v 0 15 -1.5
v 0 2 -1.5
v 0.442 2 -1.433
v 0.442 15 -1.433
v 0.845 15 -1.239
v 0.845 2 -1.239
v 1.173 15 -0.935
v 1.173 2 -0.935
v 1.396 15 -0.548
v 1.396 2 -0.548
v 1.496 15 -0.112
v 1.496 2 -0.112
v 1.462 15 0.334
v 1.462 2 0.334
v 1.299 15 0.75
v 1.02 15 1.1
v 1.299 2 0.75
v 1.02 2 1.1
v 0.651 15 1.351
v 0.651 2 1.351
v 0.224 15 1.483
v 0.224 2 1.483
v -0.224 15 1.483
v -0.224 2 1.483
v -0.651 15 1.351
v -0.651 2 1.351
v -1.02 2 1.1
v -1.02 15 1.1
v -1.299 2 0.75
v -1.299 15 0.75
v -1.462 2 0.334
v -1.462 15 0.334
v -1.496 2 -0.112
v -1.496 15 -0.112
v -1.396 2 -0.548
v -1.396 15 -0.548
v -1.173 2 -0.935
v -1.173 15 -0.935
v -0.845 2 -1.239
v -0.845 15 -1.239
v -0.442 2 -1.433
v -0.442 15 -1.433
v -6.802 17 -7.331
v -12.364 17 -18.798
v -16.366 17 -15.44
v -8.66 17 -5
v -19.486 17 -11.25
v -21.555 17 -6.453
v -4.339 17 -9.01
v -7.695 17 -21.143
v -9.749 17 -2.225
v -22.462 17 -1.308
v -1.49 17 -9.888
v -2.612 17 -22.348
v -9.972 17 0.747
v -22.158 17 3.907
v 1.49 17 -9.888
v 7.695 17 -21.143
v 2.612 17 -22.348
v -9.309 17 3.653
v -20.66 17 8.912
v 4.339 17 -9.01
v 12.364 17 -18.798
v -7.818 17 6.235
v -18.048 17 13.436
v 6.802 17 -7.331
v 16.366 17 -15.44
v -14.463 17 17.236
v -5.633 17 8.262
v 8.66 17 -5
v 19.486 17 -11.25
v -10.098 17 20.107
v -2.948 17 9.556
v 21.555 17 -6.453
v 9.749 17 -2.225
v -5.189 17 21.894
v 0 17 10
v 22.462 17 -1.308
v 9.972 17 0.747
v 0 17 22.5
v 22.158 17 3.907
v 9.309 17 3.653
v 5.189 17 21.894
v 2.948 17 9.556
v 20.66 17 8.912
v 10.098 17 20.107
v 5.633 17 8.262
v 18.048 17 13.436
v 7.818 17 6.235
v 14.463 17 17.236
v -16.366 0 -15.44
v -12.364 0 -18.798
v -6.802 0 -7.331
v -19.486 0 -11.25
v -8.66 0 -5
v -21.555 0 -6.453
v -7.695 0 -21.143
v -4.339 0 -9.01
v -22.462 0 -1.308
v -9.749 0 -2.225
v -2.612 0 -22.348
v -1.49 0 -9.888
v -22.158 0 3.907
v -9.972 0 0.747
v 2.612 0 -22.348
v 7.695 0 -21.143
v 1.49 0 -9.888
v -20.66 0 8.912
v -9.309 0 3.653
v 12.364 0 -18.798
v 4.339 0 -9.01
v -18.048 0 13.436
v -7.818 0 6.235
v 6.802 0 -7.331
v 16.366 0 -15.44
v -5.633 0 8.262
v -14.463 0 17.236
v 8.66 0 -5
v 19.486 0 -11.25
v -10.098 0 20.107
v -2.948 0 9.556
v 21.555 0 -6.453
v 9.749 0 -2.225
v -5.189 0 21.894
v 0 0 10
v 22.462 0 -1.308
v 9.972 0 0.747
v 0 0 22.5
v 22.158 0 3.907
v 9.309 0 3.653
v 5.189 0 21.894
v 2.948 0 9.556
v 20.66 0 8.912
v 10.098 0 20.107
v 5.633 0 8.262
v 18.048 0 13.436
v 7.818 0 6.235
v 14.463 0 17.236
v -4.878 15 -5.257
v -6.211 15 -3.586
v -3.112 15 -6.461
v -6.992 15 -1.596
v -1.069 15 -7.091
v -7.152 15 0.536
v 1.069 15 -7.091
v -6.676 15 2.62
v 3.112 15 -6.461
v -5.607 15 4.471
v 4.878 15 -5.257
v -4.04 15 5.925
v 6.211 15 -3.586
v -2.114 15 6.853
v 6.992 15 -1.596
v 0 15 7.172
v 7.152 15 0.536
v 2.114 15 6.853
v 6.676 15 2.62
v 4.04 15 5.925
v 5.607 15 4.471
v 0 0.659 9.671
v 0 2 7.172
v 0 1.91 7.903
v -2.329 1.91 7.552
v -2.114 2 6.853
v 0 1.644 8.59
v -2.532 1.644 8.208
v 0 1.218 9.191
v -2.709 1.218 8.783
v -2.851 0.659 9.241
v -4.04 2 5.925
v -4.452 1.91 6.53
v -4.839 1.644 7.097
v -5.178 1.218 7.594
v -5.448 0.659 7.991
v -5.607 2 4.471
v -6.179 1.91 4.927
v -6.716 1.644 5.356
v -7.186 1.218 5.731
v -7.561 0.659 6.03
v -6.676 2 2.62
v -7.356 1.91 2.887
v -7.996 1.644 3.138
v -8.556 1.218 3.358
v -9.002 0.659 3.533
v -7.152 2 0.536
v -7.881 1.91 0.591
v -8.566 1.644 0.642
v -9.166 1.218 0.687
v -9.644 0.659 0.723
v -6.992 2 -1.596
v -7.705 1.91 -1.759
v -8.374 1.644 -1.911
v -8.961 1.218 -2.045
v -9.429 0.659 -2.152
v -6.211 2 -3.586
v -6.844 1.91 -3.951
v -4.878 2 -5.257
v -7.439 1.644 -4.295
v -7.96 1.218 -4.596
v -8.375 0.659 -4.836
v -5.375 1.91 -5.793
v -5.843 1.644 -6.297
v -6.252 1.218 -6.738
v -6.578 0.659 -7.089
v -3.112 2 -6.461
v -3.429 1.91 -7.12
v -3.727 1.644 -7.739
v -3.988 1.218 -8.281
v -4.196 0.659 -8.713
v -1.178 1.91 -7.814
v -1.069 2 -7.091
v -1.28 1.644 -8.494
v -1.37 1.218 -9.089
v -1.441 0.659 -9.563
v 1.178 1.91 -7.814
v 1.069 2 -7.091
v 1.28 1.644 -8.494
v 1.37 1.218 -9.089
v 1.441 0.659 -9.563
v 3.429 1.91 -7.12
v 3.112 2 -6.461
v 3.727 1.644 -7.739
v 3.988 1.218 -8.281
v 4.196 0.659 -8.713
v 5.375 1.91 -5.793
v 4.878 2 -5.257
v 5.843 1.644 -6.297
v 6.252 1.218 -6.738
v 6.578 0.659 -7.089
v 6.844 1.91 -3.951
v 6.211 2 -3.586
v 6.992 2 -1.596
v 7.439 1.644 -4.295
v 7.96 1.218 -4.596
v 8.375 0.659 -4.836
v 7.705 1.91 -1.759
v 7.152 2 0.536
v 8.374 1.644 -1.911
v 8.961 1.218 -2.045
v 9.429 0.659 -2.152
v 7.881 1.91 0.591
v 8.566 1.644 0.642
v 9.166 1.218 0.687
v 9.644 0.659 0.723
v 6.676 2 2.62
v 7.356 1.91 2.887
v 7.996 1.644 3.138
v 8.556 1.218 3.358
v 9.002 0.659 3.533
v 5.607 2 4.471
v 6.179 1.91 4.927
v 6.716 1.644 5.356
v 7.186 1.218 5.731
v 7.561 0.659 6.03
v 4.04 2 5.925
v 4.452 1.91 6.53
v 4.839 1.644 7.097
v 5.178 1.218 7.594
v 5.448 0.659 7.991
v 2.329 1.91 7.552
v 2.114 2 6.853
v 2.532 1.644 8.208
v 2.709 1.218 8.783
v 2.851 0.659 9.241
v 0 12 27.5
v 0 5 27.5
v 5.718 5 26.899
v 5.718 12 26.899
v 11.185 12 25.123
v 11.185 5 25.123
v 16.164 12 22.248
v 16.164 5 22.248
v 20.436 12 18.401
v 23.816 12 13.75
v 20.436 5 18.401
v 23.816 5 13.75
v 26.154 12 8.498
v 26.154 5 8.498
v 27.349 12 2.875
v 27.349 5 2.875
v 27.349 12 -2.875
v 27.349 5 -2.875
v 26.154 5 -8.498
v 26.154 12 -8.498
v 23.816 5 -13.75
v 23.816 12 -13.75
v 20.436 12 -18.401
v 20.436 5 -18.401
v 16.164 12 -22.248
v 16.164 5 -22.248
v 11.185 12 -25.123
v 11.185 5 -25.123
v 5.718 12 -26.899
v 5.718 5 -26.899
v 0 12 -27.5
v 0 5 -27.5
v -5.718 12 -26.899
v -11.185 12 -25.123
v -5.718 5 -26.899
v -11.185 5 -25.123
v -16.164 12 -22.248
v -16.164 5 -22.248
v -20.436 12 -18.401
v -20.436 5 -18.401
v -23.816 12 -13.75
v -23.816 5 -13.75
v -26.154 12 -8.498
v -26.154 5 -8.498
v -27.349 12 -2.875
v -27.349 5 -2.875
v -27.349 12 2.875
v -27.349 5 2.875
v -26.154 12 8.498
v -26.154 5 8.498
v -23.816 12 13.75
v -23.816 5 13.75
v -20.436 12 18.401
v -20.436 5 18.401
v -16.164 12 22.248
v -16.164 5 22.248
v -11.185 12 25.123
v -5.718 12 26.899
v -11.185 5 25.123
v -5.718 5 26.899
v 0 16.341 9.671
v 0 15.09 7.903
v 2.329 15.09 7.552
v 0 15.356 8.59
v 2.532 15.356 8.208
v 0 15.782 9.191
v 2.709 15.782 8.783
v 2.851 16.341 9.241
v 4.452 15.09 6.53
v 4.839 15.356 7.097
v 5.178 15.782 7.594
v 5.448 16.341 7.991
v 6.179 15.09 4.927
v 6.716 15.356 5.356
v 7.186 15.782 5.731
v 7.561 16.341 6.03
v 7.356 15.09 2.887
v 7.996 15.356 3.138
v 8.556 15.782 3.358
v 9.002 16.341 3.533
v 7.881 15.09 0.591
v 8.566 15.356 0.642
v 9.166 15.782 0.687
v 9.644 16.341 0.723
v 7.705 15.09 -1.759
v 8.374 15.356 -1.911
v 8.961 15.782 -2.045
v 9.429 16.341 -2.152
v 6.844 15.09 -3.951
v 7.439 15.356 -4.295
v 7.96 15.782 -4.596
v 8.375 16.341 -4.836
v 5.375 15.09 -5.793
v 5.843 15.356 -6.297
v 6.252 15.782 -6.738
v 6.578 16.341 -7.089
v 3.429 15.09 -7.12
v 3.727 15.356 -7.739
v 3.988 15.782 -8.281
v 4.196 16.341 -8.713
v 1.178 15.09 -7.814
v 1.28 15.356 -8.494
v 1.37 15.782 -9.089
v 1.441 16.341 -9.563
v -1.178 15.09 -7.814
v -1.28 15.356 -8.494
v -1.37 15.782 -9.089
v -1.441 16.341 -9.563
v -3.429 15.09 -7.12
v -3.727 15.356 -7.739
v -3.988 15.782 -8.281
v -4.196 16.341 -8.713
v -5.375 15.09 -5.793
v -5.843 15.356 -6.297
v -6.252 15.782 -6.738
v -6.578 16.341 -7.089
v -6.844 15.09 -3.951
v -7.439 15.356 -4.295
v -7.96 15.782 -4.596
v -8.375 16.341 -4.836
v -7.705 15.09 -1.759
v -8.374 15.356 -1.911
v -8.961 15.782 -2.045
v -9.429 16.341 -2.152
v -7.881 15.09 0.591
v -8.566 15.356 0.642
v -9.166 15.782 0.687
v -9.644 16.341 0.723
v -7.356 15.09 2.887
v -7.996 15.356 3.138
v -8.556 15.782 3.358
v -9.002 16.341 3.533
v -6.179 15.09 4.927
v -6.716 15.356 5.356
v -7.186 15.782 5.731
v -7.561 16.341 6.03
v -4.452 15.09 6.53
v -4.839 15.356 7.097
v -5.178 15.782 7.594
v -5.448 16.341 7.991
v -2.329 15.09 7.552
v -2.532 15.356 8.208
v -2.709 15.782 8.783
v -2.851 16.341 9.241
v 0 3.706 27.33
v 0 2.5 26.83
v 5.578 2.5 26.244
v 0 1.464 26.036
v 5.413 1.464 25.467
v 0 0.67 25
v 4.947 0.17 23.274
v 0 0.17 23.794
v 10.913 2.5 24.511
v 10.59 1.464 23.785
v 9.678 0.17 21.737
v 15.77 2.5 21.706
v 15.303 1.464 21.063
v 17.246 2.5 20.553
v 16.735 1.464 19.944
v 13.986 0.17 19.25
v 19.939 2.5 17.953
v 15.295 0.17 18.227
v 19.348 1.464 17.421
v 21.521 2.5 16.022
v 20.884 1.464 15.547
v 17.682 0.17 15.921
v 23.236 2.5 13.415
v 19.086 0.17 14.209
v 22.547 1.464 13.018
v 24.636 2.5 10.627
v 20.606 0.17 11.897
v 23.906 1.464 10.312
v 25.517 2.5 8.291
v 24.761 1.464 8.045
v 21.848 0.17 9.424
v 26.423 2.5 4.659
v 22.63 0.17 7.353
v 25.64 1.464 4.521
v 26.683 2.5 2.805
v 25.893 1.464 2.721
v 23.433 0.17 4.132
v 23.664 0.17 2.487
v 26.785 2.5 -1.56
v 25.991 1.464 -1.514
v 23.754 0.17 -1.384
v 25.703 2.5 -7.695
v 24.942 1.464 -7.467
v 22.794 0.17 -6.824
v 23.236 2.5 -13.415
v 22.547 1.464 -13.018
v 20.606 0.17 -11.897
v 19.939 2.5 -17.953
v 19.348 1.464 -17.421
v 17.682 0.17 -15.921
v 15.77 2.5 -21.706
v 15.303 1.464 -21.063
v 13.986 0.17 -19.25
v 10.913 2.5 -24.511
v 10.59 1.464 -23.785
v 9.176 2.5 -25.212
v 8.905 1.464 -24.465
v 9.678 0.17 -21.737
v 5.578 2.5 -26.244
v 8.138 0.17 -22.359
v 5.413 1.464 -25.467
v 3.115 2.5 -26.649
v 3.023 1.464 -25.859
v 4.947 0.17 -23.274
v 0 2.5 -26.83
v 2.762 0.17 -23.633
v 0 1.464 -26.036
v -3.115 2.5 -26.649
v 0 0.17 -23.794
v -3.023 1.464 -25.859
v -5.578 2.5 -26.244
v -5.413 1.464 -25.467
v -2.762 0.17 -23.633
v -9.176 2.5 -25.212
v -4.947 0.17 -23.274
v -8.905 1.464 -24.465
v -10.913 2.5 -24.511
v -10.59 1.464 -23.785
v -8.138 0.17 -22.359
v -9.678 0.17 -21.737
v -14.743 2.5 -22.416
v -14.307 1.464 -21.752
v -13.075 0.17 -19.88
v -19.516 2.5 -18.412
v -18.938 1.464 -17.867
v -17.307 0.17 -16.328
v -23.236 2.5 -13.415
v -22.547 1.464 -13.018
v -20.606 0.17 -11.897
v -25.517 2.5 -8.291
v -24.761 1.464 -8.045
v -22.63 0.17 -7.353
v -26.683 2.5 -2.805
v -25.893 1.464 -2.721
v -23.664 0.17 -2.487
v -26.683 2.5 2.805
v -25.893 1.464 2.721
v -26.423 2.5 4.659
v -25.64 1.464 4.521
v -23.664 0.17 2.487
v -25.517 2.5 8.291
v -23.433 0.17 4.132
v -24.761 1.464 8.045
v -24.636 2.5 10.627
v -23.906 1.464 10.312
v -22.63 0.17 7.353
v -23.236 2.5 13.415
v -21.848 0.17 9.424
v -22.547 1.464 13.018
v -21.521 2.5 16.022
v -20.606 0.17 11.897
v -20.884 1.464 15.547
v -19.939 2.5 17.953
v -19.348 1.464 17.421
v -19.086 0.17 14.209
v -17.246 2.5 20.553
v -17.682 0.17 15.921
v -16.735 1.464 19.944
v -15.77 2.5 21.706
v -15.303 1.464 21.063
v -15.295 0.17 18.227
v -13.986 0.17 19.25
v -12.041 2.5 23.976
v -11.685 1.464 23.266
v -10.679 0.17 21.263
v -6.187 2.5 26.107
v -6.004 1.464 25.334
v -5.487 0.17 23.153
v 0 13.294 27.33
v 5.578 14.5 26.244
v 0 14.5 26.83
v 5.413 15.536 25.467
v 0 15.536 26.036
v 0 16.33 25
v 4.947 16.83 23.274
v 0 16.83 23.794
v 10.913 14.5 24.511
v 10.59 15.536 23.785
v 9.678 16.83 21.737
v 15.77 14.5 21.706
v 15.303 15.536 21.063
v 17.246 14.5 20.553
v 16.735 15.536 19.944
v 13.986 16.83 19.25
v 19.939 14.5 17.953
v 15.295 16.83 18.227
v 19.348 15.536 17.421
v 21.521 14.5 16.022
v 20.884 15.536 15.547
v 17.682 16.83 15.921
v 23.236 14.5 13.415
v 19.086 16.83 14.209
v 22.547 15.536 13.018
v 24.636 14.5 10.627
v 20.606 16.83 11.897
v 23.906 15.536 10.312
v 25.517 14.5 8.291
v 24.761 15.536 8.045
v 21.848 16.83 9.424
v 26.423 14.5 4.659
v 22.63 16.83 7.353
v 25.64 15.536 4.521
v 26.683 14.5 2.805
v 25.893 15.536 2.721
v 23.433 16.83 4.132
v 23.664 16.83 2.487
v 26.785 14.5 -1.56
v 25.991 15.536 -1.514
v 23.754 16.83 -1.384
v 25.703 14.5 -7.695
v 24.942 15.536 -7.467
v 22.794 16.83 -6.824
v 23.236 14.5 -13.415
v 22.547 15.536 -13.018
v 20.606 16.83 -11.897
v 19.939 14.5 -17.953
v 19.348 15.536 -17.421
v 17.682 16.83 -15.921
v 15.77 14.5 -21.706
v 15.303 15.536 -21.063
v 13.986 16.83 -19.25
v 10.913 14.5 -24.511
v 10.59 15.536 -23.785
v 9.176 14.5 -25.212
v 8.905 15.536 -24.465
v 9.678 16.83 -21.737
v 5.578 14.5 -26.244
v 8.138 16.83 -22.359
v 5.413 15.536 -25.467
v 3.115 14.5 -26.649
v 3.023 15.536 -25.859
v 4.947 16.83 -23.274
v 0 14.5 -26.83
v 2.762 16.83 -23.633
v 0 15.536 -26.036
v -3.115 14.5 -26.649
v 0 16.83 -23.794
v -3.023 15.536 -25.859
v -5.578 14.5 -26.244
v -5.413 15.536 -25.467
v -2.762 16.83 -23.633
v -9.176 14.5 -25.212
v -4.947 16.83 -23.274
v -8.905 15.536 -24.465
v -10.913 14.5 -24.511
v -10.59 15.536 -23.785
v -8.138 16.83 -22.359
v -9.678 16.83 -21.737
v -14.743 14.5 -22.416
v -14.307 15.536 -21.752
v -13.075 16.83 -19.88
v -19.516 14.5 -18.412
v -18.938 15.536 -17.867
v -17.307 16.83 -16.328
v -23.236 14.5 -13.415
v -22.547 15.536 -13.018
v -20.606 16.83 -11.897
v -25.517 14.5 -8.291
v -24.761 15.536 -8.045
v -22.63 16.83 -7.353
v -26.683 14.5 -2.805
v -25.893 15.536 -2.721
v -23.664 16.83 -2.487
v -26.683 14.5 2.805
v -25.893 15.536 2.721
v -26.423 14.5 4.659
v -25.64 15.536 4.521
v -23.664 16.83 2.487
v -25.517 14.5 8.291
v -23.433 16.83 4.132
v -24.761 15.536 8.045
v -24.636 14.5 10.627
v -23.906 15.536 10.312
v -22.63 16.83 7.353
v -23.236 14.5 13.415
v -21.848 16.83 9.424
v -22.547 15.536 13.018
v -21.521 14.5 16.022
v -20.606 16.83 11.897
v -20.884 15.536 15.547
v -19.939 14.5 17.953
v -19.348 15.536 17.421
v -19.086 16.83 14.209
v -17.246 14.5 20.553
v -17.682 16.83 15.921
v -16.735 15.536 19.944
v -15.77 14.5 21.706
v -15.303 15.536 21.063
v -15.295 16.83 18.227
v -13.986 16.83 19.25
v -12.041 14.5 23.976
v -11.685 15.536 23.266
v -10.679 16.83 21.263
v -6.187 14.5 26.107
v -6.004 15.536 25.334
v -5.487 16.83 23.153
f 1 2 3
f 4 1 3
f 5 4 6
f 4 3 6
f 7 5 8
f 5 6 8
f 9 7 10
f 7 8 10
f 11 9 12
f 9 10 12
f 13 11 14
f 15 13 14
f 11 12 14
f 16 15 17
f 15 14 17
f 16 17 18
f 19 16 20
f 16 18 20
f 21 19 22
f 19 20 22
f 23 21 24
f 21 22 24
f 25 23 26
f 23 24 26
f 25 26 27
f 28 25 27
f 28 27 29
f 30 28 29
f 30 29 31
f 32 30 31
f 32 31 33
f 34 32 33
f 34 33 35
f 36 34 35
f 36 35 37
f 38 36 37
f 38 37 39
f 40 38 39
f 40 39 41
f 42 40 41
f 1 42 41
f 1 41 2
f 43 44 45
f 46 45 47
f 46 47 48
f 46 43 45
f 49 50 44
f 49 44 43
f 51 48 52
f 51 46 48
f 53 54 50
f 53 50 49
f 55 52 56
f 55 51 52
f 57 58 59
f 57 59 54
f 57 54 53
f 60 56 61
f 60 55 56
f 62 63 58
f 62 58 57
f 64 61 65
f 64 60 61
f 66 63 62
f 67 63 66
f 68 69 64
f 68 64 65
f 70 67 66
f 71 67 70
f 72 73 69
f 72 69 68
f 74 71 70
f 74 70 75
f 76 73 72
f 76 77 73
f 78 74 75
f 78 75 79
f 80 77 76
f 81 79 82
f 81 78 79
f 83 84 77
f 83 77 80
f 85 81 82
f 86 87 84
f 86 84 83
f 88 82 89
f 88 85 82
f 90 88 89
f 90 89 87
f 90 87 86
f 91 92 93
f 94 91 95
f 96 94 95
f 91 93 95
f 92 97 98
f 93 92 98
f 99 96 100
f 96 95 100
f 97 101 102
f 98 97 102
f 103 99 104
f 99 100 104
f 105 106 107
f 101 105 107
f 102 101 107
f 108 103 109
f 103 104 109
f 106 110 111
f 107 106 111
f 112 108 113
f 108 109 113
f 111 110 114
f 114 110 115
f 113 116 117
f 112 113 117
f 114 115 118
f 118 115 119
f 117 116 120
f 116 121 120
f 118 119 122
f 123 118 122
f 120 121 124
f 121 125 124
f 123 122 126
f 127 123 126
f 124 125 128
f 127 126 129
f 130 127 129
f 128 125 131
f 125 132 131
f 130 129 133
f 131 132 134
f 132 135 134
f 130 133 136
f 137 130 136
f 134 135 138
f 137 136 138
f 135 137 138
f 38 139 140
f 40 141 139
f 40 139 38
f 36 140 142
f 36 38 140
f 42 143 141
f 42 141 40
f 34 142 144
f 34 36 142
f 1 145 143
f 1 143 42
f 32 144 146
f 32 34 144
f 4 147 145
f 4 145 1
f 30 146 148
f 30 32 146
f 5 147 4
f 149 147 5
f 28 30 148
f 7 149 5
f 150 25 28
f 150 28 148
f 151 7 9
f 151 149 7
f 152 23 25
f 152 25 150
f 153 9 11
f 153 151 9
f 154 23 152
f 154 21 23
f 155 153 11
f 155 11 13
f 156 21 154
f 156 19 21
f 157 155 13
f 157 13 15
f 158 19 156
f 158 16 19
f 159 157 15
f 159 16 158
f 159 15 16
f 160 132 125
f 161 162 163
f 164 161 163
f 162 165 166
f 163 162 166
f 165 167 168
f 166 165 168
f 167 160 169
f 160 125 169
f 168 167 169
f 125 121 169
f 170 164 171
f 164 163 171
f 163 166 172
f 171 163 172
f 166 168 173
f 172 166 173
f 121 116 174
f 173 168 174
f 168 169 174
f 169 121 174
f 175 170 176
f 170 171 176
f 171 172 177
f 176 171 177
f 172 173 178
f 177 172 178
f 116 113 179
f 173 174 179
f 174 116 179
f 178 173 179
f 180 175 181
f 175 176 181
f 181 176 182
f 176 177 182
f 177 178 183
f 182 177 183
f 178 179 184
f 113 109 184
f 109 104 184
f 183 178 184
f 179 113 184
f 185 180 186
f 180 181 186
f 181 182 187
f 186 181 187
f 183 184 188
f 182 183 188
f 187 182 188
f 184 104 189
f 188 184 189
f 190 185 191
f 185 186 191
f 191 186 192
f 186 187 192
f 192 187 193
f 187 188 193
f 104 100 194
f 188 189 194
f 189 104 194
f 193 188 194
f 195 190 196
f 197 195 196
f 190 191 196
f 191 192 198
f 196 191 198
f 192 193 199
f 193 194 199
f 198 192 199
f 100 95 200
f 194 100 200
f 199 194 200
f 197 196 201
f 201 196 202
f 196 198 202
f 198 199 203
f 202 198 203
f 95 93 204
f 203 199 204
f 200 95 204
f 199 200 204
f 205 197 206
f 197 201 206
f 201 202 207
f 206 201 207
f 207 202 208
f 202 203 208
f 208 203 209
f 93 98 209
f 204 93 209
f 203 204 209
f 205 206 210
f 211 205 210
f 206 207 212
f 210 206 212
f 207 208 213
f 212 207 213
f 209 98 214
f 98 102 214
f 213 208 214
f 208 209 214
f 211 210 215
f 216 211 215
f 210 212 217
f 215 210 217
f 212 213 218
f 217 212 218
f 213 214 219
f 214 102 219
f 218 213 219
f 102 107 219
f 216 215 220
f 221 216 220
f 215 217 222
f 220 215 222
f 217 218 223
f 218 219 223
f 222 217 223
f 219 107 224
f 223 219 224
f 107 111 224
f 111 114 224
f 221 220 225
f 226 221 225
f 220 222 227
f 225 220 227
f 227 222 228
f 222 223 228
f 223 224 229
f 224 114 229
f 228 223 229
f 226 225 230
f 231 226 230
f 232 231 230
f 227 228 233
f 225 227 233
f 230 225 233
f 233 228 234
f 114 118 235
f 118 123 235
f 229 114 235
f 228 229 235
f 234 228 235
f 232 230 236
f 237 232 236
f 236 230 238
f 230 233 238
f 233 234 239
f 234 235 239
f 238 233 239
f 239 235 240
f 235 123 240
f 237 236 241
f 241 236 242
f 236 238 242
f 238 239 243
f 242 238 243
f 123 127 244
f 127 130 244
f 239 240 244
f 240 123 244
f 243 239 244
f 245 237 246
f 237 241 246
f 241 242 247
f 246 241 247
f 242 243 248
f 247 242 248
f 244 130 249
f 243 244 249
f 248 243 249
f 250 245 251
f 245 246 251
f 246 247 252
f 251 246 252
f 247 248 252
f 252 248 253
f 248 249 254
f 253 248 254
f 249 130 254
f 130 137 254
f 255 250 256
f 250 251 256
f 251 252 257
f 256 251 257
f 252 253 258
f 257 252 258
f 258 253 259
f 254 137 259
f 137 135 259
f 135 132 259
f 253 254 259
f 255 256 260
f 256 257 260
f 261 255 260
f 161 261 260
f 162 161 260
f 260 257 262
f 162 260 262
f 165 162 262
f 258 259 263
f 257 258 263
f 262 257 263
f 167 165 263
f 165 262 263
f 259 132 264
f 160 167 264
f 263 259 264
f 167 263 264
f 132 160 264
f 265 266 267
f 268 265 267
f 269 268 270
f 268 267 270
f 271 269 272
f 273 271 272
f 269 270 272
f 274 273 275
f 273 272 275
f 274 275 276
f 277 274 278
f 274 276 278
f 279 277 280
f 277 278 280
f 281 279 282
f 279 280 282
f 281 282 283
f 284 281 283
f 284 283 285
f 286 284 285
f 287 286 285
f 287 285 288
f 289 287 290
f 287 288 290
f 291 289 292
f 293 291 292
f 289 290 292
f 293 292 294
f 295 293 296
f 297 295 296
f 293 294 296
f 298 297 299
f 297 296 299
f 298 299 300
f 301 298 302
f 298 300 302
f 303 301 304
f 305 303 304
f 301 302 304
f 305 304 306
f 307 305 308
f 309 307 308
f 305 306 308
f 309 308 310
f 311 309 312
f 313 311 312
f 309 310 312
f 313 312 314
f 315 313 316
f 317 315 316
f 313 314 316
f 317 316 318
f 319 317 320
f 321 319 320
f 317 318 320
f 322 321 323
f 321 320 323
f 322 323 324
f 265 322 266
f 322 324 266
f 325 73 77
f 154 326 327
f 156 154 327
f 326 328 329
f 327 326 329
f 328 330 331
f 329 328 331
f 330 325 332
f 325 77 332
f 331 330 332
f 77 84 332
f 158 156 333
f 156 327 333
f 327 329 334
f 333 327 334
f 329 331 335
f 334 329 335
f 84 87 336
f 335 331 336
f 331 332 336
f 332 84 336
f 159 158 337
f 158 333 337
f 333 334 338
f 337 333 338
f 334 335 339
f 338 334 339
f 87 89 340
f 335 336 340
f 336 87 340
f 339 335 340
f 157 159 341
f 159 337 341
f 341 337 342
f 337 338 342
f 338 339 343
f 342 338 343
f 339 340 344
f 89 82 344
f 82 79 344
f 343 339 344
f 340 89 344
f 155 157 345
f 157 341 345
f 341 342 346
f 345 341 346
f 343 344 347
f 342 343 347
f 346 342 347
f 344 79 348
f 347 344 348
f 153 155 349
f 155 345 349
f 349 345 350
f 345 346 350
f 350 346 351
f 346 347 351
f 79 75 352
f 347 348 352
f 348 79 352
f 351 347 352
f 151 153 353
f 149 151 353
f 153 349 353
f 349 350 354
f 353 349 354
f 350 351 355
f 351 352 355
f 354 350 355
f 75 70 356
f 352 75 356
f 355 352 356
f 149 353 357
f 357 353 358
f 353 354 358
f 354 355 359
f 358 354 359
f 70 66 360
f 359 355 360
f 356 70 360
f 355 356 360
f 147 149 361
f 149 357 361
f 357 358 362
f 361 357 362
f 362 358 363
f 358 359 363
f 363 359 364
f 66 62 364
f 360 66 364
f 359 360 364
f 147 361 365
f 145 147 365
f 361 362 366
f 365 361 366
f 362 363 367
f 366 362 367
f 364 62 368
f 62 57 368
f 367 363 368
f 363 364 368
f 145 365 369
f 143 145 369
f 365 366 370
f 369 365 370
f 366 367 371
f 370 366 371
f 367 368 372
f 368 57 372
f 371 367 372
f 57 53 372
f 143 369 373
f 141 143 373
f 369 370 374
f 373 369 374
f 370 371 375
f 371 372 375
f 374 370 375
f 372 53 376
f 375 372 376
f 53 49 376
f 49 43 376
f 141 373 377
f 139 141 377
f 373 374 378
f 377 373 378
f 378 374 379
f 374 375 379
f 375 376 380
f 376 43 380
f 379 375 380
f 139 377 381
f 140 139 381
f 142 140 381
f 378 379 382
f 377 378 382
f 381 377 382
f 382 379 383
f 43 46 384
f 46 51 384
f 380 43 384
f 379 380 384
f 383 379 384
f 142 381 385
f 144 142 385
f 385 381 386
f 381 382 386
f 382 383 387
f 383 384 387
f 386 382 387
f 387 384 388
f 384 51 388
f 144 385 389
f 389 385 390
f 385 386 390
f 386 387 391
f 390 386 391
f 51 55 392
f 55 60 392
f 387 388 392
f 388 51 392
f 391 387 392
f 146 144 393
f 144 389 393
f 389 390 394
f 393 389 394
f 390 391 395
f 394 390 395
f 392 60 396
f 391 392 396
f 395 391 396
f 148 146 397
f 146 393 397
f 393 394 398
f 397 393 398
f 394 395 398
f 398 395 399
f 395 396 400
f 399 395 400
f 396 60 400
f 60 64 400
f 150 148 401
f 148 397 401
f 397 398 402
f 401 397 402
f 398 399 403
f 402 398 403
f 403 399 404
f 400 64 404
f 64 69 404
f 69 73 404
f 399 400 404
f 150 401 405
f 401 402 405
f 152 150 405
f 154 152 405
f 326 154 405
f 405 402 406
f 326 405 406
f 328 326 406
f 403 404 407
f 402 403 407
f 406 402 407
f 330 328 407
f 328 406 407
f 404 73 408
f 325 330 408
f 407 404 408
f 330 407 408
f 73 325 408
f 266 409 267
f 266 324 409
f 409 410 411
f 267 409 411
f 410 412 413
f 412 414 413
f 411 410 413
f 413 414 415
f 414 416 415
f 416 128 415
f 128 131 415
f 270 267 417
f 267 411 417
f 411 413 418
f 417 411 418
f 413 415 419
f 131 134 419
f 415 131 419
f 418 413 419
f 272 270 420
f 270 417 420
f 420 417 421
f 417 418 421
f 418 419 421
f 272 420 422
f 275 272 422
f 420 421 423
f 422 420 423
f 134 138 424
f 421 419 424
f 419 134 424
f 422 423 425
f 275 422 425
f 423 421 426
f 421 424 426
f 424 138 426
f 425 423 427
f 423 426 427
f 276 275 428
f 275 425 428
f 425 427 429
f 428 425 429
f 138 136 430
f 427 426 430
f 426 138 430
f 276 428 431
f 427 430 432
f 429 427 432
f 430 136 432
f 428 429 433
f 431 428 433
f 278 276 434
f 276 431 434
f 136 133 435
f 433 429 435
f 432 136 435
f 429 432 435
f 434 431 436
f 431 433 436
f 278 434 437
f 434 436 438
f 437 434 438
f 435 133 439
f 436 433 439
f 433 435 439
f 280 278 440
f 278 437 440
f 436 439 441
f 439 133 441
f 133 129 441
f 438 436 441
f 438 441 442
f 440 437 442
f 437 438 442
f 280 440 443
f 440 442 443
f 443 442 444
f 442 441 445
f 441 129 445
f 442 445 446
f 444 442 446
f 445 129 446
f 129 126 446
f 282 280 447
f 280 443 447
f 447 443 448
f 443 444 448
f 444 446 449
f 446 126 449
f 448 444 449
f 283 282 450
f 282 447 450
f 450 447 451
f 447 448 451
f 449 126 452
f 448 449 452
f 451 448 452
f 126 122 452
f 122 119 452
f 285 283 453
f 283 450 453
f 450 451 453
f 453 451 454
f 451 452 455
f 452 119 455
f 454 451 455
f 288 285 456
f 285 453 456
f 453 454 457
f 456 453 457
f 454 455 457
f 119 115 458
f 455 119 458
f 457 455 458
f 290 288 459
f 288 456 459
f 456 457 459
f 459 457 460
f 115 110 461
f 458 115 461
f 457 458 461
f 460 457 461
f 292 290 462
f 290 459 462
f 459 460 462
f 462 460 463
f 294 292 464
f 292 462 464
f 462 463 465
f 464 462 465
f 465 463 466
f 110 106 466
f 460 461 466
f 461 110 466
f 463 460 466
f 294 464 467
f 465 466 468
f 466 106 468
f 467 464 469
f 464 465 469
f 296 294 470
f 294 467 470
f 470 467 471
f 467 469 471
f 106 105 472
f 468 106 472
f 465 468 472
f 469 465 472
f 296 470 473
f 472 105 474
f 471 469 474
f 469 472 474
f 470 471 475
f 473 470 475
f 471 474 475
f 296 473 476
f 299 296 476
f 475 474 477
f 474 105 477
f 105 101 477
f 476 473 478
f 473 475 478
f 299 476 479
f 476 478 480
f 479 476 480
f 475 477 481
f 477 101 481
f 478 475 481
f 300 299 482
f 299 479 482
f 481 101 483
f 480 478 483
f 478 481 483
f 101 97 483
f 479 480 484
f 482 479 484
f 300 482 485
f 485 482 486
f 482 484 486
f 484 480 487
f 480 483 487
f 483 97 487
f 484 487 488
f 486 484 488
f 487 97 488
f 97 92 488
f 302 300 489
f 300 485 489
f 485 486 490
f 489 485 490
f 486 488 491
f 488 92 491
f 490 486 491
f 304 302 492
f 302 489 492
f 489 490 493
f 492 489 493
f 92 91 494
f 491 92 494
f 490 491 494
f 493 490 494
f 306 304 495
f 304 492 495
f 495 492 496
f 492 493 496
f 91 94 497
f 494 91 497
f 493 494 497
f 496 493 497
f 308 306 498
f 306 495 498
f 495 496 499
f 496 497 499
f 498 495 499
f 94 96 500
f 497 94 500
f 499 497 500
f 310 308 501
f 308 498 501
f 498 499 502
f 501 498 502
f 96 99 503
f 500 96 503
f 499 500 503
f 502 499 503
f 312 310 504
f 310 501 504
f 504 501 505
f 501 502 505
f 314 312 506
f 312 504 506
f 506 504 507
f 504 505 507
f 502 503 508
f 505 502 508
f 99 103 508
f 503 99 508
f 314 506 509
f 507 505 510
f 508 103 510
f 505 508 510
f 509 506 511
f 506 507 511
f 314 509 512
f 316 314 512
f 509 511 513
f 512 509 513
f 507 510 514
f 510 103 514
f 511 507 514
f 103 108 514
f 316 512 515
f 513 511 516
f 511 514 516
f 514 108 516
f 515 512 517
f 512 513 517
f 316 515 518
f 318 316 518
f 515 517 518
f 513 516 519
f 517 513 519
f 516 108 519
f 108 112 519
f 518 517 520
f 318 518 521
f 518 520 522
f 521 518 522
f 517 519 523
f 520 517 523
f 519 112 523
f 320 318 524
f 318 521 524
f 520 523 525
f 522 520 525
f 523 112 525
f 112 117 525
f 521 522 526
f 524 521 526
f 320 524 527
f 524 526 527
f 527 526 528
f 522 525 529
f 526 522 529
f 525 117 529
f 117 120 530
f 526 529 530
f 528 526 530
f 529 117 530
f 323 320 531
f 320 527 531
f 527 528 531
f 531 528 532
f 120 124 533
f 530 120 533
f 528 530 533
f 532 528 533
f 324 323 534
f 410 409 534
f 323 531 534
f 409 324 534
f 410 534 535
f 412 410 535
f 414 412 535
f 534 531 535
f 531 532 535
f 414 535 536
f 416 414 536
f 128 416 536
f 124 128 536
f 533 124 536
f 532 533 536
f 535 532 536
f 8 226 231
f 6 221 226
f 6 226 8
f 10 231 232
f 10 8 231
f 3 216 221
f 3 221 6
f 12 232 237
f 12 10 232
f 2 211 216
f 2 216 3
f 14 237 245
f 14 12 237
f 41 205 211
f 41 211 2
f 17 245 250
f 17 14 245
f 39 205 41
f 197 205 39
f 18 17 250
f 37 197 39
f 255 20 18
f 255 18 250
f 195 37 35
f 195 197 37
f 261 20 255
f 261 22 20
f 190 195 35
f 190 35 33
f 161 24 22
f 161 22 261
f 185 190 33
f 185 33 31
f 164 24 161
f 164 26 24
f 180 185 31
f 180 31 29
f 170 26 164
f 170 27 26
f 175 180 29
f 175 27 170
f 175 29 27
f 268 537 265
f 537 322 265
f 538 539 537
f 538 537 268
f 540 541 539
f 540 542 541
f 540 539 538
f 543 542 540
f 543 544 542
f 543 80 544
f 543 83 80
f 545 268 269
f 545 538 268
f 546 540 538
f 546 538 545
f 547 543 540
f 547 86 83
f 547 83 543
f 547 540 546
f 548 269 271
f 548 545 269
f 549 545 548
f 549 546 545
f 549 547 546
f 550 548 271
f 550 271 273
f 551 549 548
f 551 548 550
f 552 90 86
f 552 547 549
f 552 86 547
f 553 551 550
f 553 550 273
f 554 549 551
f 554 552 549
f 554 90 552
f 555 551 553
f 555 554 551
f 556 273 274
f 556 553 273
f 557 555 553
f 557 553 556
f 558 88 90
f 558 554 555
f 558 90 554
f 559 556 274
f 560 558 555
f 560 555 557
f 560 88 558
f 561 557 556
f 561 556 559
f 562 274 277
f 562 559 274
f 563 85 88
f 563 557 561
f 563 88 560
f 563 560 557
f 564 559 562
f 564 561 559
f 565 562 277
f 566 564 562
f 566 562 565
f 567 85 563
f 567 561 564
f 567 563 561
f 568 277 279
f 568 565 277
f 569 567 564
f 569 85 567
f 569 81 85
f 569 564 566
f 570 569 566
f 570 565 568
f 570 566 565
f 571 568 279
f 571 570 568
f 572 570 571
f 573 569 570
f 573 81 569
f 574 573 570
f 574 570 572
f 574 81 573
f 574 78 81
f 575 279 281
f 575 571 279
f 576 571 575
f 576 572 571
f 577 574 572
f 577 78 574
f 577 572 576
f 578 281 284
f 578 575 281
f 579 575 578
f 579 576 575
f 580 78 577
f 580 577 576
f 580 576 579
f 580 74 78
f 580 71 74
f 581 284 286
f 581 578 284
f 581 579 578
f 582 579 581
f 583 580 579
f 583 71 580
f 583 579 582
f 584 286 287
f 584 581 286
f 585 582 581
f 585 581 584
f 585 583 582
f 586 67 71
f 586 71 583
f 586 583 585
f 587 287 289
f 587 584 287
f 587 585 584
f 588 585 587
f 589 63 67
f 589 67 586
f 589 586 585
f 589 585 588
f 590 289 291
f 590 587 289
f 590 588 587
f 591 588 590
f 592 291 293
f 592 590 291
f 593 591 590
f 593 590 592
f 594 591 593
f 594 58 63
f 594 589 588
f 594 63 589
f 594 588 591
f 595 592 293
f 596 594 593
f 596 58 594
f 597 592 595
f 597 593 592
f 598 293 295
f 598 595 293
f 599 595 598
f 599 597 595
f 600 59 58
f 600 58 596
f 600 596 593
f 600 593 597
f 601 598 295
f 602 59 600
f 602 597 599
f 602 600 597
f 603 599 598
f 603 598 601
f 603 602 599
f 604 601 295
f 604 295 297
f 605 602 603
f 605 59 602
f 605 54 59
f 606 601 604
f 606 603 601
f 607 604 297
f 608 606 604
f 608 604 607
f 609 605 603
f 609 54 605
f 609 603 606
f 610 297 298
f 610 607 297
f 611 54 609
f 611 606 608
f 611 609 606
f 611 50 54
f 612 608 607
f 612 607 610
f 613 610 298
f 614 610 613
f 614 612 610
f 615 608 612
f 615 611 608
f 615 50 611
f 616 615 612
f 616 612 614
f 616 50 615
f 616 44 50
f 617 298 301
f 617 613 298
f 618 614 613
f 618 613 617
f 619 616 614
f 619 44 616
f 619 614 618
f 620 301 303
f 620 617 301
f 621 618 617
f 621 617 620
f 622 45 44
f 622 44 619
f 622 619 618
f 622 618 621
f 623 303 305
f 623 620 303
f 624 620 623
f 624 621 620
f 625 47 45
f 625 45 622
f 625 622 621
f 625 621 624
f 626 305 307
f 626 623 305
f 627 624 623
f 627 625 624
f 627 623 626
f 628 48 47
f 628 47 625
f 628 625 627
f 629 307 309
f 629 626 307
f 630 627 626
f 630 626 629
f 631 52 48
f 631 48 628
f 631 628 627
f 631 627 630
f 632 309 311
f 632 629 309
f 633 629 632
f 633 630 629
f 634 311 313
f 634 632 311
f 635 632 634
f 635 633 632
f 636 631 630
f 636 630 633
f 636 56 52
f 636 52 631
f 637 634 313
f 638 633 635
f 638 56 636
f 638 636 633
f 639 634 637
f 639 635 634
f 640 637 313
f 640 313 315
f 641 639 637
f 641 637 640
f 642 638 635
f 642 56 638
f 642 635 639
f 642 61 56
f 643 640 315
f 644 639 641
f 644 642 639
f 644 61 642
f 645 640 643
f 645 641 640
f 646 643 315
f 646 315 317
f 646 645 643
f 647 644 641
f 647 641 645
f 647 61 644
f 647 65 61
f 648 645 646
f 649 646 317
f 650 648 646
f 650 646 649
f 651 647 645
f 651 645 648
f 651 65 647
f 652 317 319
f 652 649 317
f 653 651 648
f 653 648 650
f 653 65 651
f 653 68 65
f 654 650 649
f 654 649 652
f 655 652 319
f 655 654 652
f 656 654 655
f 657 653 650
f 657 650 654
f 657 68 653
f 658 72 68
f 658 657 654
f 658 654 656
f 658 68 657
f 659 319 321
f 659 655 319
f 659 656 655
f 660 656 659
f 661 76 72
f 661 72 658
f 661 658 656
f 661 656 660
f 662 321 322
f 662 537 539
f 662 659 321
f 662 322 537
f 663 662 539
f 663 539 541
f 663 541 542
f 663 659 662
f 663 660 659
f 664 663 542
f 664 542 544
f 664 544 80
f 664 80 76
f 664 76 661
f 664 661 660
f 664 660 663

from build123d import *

# Parameters (mm, degrees)
SKETCH_1_R          = 27.5
EXTRUDE_1_DEPTH     = 17
FILLET_1_R          = 5
SKETCH_2_R          = 1.5
CUT_EXTRUDE_1_DEPTH = 43.444080989
SKETCH_3_R          = 10
CUT_EXTRUDE_2_DEPTH = 2
CUT_EXTRUDE_START   = -2
SKETCH_4_R          = 10
CUT_EXTRUDE_3_DEPTH = 2
FILLET_2_R          = 3


with BuildPart() as part:
    # 草图1 → 凸台-拉伸1 (new body)
    with BuildSketch(Plane(origin=(0, 0, 0), x_dir=(1, 0, 0), z_dir=(0, 1, 0))):
        with Locations(Location((0, 0, 0), (0, 0, 270))):
            Circle(SKETCH_1_R)
    extrude(amount=EXTRUDE_1_DEPTH)

    # 圆角1
    fillet_1_edges = [part.edges().sort_by_distance(p)[0] for p in [
        (0, 0, -27.5),
        (0, 17, -27.5),
    ]]
    fillet(fillet_1_edges, radius=FILLET_1_R)

    # 草图2 → 切除-拉伸1 (cut, through all)
    with BuildSketch(Plane.XZ):
        with Locations(Location((0, 0, 0), (0, 0, 270))):
            Circle(SKETCH_2_R)
    extrude(amount=-CUT_EXTRUDE_1_DEPTH, mode=Mode.SUBTRACT)

    # 草图3 → 切除-拉伸2 (cut)
    with BuildSketch(Plane(origin=(0, 17, 0), x_dir=(1, 0, 0), z_dir=(0, 1, 0))):
        with Locations(Location((0, 0, 0), (0, 0, 270))):
            Circle(SKETCH_3_R)
    extrude(amount=-CUT_EXTRUDE_2_DEPTH, mode=Mode.SUBTRACT)

    # 草图4 → 切除-拉伸3 (cut)
    with BuildSketch(Plane.XZ.offset(CUT_EXTRUDE_START)):
        with Locations(Location((0, 0, 0), (0, 0, 90))):
            Circle(SKETCH_4_R)
    extrude(amount=CUT_EXTRUDE_3_DEPTH, mode=Mode.SUBTRACT)

    # 圆角2
    # the kernel refuses this fillet: 3 mm, written as the material it adds along each edge
    with BuildSketch(Plane(origin=(0, 15, 0), x_dir=(0, 0, 1), z_dir=(-1, 0, 0))) as fillet_2_piece_1:
        with BuildLine():
            CenterArc((7.171572875, 3), FILLET_2_R, 270, 70.528779366)
            Line((7.171572875, 0), (7.171572875, -0.06))
            Line((7.171572875, -0.06), (10, -0.06))
            Line((10, -0.06), (10.06, 0))
            ThreePointArc((10.06, 0), (10.06, 1), (10.056568542, 1.98))
            Line((10.056568542, 1.98), (10, 2))
        make_face()
    revolve(axis=Axis((0, 15, 0), (0, 1, 0)))
    with BuildSketch(Plane(origin=(0, 2, 0), x_dir=(0, 0, 1), z_dir=(1, 0, 0))) as fillet_2_piece_2:
        with BuildLine():
            CenterArc((7.171572875, 3), FILLET_2_R, 270, 70.528779366)
            Line((7.171572875, 0), (7.171572875, -0.06))
            Line((7.171572875, -0.06), (10, -0.06))
            Line((10, -0.06), (10.06, 0))
            ThreePointArc((10.06, 0), (10.06, 1), (10.056568542, 1.98))
            Line((10.056568542, 1.98), (10, 2))
        make_face()
    revolve(axis=Axis((0, 2, 0), (0, -1, 0)))


solid = part.part
